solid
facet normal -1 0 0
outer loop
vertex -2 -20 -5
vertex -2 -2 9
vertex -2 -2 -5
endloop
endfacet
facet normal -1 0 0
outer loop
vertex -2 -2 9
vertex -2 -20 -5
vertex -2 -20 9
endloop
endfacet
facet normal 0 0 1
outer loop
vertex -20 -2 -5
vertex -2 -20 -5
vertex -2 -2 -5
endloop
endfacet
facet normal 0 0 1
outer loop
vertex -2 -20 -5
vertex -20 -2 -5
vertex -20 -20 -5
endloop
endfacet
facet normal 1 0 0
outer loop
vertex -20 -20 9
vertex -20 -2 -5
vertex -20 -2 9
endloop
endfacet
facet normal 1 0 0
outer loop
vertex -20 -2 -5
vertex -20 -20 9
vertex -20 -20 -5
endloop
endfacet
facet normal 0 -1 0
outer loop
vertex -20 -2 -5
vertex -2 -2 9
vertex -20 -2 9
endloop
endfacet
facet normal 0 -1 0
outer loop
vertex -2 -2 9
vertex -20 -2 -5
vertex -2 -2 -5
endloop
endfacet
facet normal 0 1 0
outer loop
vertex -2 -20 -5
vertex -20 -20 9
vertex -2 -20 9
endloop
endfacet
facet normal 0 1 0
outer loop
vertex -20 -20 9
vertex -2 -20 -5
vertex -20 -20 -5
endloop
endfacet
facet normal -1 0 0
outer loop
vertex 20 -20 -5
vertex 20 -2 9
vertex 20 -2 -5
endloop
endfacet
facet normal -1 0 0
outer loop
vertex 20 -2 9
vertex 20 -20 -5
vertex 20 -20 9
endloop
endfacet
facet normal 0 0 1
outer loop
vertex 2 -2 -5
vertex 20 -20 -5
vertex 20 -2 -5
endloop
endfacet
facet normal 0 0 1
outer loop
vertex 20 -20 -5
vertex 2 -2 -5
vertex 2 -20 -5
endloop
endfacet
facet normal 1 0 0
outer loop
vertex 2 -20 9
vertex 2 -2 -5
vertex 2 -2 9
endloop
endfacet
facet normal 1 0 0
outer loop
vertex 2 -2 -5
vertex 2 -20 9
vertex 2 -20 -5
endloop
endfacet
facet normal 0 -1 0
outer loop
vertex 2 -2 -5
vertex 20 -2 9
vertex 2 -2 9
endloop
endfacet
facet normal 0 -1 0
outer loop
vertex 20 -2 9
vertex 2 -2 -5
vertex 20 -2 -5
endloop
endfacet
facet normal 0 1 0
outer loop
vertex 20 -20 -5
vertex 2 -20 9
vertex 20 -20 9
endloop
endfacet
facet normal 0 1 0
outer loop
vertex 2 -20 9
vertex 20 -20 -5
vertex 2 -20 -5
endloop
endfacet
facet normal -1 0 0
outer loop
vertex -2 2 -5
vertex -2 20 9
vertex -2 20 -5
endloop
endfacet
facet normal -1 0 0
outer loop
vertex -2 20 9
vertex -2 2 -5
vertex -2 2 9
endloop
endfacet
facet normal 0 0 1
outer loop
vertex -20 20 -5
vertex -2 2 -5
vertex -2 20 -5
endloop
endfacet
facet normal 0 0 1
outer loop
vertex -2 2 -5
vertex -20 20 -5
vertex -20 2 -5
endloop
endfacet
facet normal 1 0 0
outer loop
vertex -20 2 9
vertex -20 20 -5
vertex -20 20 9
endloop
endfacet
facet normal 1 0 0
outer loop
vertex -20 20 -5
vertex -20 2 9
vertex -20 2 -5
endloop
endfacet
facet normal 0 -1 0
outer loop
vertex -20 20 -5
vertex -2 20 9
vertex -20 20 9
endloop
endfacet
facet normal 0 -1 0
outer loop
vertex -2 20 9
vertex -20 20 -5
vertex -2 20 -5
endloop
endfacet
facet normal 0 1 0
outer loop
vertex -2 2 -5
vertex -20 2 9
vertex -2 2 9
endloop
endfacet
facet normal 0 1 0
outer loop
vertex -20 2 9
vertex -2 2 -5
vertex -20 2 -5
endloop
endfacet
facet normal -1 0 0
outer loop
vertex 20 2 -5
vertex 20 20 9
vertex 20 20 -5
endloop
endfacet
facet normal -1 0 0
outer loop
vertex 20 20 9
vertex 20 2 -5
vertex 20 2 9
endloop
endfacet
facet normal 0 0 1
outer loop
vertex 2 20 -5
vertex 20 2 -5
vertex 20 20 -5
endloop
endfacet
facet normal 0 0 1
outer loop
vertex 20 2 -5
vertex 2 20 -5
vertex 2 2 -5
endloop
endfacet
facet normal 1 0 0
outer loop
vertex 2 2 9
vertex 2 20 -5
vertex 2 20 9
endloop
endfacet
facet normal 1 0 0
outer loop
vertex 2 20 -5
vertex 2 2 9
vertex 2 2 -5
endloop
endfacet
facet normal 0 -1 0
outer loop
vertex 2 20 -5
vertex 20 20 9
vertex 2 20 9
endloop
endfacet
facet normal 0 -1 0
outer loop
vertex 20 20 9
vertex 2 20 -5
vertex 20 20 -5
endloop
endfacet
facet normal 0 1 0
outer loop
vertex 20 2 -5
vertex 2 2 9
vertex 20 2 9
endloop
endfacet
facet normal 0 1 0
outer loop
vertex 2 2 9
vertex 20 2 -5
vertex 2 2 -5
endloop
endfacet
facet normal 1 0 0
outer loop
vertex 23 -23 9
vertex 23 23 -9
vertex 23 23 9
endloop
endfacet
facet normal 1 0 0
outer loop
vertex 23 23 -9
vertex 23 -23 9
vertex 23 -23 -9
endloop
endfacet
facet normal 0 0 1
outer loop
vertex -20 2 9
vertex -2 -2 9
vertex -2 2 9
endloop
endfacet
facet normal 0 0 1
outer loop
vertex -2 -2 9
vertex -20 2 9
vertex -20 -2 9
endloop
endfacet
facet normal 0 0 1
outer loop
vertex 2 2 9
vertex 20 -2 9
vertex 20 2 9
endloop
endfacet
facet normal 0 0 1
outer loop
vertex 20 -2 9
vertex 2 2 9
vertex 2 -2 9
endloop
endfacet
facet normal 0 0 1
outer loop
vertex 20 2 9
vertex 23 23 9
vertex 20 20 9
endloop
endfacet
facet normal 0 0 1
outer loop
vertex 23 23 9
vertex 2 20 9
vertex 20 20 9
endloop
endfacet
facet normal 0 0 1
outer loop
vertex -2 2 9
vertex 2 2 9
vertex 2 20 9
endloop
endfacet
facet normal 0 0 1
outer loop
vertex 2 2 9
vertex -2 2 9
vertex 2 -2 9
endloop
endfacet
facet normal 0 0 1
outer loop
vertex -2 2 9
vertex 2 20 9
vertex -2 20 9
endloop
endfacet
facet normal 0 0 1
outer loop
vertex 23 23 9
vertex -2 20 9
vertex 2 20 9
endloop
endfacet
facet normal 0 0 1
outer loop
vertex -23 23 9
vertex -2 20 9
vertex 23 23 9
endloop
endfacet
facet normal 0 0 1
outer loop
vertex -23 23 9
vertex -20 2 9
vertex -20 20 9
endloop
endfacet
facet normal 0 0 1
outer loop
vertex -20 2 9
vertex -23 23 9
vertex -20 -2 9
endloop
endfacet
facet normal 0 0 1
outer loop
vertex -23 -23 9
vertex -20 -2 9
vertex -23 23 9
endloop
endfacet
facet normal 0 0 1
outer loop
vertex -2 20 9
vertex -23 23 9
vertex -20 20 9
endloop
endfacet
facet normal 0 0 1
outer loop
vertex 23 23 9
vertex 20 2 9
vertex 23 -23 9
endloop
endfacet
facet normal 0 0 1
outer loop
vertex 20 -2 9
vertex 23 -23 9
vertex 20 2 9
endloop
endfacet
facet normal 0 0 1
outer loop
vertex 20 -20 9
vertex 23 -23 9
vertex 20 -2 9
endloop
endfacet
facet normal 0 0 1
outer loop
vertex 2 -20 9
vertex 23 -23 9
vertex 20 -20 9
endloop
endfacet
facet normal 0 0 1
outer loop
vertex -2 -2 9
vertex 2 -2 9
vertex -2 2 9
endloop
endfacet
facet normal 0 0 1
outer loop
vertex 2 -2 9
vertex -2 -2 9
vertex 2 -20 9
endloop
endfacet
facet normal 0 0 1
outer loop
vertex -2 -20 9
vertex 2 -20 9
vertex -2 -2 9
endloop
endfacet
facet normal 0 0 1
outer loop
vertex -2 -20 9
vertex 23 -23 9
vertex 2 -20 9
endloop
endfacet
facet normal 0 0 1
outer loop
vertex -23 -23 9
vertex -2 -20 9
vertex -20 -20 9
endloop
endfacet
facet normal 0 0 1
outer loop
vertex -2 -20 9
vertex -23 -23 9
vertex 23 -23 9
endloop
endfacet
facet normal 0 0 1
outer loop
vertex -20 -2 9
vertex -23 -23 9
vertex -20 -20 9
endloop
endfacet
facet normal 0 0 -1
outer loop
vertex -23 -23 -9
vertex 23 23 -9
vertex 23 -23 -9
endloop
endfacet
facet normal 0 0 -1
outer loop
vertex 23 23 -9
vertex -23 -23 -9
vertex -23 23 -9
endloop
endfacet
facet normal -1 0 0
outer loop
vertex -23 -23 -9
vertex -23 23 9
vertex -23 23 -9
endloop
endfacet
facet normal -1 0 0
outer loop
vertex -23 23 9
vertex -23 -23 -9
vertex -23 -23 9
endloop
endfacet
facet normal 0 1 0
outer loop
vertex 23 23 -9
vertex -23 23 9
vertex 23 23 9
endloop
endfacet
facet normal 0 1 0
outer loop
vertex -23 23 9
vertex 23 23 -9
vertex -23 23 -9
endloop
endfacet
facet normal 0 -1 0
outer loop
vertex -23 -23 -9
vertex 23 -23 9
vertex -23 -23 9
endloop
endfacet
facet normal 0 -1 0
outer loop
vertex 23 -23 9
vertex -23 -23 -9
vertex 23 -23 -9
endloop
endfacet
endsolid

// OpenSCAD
$fn = 32;

// ----------------------------------------------------------------------
// Pocket plate 46 x 46 x 18
// 2 x 2 pockets 18 mm square, 14 mm deep
// ----------------------------------------------------------------------

// --- parameters (mm) ---
thickness = 18;  // plate thickness
floor_t = 4;     // material left under each pocket
pocket = 18;     // pocket side length
pitch_x = 22;    // pocket pitch along X
pitch_y = 22;    // pocket pitch along Y
cols = 2;        // pockets per row
rows = 2;        // rows of pockets

// --- derived feature positions (mm) ---
depth = thickness - floor_t;        // = 14   pocket depth, down to the floor
span_x = (cols - 1) * pitch_x;      // = 22   distance between outer pockets
span_y = (rows - 1) * pitch_y;      // = 22   distance between outer pocket rows
origin_x = -span_x / 2;             // = -11   X of the first pocket
origin_y = -span_y / 2;             // = -11   Y of the first pocket
plate = [span_x + pocket + 6, span_y + pocket + 6, thickness];  // = [46, 46, 18]   overall size: pockets plus 3 mm of wall on each side
feature_centers = [
  [origin_x + 0 * pitch_x, origin_y + 0 * pitch_y],
  [origin_x + 1 * pitch_x, origin_y + 0 * pitch_y],
  [origin_x + 0 * pitch_x, origin_y + 1 * pitch_y],
  [origin_x + 1 * pitch_x, origin_y + 1 * pitch_y]
];   // pocket centres, used verbatim by the cutter loop

// plate outline, then one pocket per centre in feature_centers
difference() {
  cube(plate, center = true);
  for (centre = feature_centers)
    translate([centre[0] - pocket / 2, centre[1] - pocket / 2, plate[2] / 2 - depth])
      cube([pocket, pocket, depth + 1]);  // centred on the declared pocket centre
}
